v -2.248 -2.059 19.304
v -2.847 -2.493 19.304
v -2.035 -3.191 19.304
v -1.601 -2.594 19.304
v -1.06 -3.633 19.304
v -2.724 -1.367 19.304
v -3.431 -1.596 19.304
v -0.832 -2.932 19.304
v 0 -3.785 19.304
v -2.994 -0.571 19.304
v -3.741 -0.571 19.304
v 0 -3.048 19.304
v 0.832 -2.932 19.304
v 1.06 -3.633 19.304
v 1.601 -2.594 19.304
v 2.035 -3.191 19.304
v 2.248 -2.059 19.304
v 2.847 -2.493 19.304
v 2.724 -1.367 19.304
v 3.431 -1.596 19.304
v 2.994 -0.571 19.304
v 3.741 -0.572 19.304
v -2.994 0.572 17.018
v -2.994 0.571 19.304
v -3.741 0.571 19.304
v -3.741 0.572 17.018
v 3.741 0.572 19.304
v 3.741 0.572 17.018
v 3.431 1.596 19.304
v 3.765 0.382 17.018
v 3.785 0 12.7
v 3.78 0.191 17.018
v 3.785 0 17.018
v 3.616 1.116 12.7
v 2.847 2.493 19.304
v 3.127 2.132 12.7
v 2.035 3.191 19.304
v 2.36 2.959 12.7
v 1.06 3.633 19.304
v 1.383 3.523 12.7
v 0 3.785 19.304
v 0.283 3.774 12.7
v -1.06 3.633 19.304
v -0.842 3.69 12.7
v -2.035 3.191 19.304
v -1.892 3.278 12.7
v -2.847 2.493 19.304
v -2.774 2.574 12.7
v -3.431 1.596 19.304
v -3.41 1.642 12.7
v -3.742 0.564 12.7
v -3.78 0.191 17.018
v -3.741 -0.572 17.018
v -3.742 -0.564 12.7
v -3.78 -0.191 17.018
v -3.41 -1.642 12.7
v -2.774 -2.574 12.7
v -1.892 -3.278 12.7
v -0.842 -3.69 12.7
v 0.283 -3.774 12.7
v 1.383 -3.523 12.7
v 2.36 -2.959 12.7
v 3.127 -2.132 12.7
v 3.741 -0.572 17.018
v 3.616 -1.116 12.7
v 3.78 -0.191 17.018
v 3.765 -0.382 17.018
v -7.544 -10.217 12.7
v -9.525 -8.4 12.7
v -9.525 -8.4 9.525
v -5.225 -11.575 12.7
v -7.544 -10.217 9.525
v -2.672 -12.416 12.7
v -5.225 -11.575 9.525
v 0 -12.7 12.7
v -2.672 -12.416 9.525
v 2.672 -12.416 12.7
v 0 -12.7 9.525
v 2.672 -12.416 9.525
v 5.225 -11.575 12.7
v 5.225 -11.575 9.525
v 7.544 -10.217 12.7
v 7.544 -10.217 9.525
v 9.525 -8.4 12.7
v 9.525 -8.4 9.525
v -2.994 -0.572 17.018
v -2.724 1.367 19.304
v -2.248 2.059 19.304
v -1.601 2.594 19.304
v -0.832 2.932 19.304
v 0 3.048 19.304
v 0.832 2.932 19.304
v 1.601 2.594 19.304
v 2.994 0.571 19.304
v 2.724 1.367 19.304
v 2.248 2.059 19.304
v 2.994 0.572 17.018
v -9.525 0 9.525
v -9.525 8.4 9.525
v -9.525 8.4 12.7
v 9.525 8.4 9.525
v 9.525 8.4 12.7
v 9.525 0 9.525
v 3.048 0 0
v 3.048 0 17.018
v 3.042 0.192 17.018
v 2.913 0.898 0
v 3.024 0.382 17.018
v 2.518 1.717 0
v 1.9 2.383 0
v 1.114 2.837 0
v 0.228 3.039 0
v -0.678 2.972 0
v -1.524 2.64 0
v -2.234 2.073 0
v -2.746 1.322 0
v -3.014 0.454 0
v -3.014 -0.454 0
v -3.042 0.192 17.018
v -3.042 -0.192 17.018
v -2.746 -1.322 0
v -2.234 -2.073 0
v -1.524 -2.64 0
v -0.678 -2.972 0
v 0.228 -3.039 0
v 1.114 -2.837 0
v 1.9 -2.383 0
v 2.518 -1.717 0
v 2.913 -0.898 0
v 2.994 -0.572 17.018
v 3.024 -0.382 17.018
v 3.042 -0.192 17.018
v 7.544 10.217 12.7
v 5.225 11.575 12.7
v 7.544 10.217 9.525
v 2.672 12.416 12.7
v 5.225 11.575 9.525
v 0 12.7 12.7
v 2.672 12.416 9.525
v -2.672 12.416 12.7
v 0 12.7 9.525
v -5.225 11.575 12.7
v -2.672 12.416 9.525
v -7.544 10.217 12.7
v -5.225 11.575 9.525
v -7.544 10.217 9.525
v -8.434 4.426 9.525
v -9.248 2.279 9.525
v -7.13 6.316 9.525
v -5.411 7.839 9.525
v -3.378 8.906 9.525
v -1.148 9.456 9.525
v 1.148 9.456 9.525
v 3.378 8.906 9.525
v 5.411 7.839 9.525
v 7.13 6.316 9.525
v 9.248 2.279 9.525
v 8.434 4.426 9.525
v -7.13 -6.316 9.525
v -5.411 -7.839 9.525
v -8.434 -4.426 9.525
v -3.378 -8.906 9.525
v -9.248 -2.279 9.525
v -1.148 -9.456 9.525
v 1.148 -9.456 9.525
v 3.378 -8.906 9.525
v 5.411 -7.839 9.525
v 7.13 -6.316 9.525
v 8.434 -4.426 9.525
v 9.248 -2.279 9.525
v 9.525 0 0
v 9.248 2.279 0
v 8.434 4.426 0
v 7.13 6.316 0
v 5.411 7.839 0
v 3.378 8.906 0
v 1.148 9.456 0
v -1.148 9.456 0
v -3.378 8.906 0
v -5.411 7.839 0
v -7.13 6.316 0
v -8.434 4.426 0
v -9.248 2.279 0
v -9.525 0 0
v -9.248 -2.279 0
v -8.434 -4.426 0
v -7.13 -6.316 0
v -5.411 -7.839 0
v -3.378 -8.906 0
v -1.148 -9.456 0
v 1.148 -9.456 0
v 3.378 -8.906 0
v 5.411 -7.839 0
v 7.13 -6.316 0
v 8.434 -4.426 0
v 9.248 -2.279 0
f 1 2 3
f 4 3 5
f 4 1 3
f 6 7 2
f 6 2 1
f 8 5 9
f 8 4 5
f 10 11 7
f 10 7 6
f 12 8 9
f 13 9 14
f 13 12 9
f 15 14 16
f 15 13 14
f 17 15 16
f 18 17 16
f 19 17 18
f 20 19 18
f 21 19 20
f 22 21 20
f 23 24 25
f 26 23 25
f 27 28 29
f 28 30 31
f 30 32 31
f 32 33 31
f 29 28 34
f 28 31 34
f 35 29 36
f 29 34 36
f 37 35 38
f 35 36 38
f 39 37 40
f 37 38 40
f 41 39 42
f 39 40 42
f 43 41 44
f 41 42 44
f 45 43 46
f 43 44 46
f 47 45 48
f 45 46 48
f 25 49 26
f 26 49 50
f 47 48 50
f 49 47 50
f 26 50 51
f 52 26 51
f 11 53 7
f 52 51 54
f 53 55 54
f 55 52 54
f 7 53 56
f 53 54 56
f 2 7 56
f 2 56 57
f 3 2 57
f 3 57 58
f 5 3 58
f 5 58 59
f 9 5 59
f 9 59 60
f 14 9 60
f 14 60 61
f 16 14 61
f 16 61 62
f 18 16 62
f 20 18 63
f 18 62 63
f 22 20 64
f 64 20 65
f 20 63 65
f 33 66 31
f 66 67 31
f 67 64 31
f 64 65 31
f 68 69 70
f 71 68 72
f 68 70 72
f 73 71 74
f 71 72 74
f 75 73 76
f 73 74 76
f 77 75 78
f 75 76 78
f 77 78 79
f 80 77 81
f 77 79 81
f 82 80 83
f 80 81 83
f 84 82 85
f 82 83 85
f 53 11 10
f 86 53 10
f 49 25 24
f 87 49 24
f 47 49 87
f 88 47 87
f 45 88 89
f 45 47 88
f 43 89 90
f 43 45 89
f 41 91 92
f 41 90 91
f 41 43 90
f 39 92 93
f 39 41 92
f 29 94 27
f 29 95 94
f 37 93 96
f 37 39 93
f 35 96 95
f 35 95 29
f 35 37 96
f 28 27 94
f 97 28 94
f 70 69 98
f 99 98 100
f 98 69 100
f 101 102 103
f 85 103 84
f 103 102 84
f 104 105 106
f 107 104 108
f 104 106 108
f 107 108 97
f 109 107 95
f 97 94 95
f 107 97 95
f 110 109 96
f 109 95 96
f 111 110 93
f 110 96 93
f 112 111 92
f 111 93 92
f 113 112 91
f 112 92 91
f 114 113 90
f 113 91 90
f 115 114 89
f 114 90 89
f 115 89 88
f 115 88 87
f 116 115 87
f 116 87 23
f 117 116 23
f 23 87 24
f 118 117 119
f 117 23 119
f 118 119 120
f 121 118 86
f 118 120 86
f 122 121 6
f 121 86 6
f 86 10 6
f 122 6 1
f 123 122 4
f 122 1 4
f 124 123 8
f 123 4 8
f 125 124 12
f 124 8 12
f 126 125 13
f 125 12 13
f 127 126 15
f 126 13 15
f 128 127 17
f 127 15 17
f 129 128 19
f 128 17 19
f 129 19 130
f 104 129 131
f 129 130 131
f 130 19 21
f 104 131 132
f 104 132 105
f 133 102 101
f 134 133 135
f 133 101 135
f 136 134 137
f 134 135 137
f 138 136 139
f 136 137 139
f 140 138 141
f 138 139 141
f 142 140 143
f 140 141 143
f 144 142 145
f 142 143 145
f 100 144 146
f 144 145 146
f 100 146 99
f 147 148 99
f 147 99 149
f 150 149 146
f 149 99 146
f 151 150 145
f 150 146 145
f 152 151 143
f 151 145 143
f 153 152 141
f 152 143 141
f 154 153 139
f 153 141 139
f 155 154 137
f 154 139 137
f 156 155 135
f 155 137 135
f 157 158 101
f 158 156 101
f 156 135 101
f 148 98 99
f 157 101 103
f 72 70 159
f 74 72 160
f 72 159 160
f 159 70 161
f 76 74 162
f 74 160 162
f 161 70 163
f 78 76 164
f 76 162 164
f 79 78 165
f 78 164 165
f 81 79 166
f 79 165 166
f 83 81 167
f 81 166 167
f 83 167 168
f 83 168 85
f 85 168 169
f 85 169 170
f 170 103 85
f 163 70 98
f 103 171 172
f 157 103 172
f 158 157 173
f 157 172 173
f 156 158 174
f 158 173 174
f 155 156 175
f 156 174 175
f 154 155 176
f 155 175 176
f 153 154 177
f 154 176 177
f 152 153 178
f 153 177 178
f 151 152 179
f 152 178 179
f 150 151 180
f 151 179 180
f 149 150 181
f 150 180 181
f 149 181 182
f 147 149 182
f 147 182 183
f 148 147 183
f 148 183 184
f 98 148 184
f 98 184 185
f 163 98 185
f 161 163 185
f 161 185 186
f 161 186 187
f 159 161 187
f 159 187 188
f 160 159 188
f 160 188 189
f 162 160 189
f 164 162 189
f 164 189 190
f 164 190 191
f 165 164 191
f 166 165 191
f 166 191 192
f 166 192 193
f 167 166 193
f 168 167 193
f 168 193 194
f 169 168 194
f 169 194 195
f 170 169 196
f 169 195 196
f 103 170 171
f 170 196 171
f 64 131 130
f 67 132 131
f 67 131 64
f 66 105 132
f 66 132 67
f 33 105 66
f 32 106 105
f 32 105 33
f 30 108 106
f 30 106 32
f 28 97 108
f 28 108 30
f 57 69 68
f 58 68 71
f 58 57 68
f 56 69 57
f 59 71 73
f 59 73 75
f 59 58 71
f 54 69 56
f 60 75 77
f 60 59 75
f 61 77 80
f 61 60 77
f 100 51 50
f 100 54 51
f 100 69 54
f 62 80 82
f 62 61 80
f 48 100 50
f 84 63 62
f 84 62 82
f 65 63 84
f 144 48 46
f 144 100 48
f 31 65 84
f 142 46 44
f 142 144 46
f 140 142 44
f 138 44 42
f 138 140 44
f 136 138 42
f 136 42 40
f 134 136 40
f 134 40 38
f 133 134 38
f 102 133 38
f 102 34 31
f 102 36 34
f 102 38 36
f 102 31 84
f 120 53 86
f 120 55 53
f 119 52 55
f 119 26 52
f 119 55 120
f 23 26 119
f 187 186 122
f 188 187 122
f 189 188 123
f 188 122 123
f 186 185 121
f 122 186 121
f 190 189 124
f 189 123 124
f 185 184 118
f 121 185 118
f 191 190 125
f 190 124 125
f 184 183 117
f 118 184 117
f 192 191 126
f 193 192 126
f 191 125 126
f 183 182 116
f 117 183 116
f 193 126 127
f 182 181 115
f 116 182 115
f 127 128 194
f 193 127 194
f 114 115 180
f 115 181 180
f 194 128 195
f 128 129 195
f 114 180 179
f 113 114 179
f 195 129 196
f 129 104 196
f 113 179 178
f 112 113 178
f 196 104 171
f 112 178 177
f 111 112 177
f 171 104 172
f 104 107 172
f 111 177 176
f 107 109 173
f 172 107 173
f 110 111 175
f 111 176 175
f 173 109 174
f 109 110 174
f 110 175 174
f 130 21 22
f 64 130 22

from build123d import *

# Parameters (mm, degrees)
F0_R      = 9.525
F1_DEPTH  = 9.525
F2_R      = 12.7
F2_R_2    = 9.525
F3_DEPTH  = 3.175
F5_DEPTH  = 25.4
F6_R      = 3.7846
F6_R_2    = 3.048
F7_DEPTH  = 6.604
F7_FACE_R = 3.048
F8_DEPTH  = 12.701
F10_DEPTH = 2.286


with BuildPart() as f1:
    # F0 (on Top) → F1 (new body)
    with BuildSketch(Plane.XY):
        Circle(F0_R)
    extrude(amount=F1_DEPTH)

    # F2 (on face) → F3 (join)
    with BuildSketch(Plane.XY.offset(9.525)):
        Circle(F2_R)
        Circle(F2_R_2, mode=Mode.SUBTRACT)
        Circle(F2_R_2)
    extrude(amount=F3_DEPTH)

    # F4 (on face) → F5 (cut)
    with BuildSketch(Plane.XY.offset(12.7)):
        with BuildLine():
            ThreePointArc((-9.525, 8.40026), (-12.7, 0), (-9.525, -8.40026))
            Line((-9.525, -8.40026), (-9.525, 8.40026))
        make_face()
        with BuildLine():
            Line((9.525, 8.40026), (9.525, -8.40026))
            ThreePointArc((9.525, -8.40026), (11.879762, -4.490128), (12.7, 0))
            ThreePointArc((12.7, 0), (11.879762, 4.490128), (9.525, 8.40026))
        make_face()
    extrude(amount=-F5_DEPTH, mode=Mode.SUBTRACT)

    # F6 (on face) → F7 (join)
    with BuildSketch(Plane.XY.offset(12.7)):
        Circle(F6_R)
        Circle(F6_R_2, mode=Mode.SUBTRACT)
    extrude(amount=F7_DEPTH)

    # F7_face (on face) → F8 (cut, through all)
    with BuildSketch(Plane.XY.offset(12.7)):
        Circle(F7_FACE_R)
    extrude(amount=-F8_DEPTH, mode=Mode.SUBTRACT)

    # F9 (on face) → F10 (cut)
    with BuildSketch(Plane.XY.offset(19.304)):
        with BuildLine():
            Line((3.741201, -0.5715), (4.079275, -0.5715))
            Line((4.079275, -0.5715), (4.079275, 0.5715))
            Line((4.079275, 0.5715), (3.741201, 0.5715))
            ThreePointArc((3.741201, 0.5715), (3.773735, 0.286573), (3.7846, 0))
            ThreePointArc((3.7846, 0), (3.773735, -0.286573), (3.741201, -0.5715))
        make_face()
        with BuildLine():
            Line((-4.079275, -0.5715), (-3.741201, -0.5715))
            ThreePointArc((-3.741201, -0.5715), (-3.7846, 0), (-3.741201, 0.5715))
            Line((-3.741201, 0.5715), (-4.079275, 0.5715))
            Line((-4.079275, 0.5715), (-4.079275, -0.5715))
        make_face()
        with BuildLine():
            ThreePointArc((-3.741201, 0.5715), (-3.7846, 0), (-3.741201, -0.5715))
            Line((-3.741201, -0.5715), (-2.993943, -0.5715))
            ThreePointArc((-2.993943, -0.5715), (-3.048, 0), (-2.993943, 0.5715))
            Line((-2.993943, 0.5715), (-3.741201, 0.5715))
        make_face()
        with BuildLine():
            Line((2.993943, -0.5715), (3.741201, -0.5715))
            ThreePointArc((3.741201, -0.5715), (3.773735, -0.286573), (3.7846, 0))
            ThreePointArc((3.7846, 0), (3.773735, 0.286573), (3.741201, 0.5715))
            Line((3.741201, 0.5715), (2.993943, 0.5715))
            ThreePointArc((2.993943, 0.5715), (3.034456, 0.287025), (3.048, 0))
            ThreePointArc((3.048, 0), (3.034456, -0.287025), (2.993943, -0.5715))
        make_face()
        with BuildLine():
            Line((-2.993943, -0.5715), (2.993943, -0.5715))
            ThreePointArc((2.993943, -0.5715), (3.034456, -0.287025), (3.048, 0))
            ThreePointArc((3.048, 0), (3.034456, 0.287025), (2.993943, 0.5715))
            Line((2.993943, 0.5715), (-2.993943, 0.5715))
            ThreePointArc((-2.993943, 0.5715), (-3.048, 0), (-2.993943, -0.5715))
        make_face()
    extrude(amount=-F10_DEPTH, mode=Mode.SUBTRACT)


solid = f1.part
